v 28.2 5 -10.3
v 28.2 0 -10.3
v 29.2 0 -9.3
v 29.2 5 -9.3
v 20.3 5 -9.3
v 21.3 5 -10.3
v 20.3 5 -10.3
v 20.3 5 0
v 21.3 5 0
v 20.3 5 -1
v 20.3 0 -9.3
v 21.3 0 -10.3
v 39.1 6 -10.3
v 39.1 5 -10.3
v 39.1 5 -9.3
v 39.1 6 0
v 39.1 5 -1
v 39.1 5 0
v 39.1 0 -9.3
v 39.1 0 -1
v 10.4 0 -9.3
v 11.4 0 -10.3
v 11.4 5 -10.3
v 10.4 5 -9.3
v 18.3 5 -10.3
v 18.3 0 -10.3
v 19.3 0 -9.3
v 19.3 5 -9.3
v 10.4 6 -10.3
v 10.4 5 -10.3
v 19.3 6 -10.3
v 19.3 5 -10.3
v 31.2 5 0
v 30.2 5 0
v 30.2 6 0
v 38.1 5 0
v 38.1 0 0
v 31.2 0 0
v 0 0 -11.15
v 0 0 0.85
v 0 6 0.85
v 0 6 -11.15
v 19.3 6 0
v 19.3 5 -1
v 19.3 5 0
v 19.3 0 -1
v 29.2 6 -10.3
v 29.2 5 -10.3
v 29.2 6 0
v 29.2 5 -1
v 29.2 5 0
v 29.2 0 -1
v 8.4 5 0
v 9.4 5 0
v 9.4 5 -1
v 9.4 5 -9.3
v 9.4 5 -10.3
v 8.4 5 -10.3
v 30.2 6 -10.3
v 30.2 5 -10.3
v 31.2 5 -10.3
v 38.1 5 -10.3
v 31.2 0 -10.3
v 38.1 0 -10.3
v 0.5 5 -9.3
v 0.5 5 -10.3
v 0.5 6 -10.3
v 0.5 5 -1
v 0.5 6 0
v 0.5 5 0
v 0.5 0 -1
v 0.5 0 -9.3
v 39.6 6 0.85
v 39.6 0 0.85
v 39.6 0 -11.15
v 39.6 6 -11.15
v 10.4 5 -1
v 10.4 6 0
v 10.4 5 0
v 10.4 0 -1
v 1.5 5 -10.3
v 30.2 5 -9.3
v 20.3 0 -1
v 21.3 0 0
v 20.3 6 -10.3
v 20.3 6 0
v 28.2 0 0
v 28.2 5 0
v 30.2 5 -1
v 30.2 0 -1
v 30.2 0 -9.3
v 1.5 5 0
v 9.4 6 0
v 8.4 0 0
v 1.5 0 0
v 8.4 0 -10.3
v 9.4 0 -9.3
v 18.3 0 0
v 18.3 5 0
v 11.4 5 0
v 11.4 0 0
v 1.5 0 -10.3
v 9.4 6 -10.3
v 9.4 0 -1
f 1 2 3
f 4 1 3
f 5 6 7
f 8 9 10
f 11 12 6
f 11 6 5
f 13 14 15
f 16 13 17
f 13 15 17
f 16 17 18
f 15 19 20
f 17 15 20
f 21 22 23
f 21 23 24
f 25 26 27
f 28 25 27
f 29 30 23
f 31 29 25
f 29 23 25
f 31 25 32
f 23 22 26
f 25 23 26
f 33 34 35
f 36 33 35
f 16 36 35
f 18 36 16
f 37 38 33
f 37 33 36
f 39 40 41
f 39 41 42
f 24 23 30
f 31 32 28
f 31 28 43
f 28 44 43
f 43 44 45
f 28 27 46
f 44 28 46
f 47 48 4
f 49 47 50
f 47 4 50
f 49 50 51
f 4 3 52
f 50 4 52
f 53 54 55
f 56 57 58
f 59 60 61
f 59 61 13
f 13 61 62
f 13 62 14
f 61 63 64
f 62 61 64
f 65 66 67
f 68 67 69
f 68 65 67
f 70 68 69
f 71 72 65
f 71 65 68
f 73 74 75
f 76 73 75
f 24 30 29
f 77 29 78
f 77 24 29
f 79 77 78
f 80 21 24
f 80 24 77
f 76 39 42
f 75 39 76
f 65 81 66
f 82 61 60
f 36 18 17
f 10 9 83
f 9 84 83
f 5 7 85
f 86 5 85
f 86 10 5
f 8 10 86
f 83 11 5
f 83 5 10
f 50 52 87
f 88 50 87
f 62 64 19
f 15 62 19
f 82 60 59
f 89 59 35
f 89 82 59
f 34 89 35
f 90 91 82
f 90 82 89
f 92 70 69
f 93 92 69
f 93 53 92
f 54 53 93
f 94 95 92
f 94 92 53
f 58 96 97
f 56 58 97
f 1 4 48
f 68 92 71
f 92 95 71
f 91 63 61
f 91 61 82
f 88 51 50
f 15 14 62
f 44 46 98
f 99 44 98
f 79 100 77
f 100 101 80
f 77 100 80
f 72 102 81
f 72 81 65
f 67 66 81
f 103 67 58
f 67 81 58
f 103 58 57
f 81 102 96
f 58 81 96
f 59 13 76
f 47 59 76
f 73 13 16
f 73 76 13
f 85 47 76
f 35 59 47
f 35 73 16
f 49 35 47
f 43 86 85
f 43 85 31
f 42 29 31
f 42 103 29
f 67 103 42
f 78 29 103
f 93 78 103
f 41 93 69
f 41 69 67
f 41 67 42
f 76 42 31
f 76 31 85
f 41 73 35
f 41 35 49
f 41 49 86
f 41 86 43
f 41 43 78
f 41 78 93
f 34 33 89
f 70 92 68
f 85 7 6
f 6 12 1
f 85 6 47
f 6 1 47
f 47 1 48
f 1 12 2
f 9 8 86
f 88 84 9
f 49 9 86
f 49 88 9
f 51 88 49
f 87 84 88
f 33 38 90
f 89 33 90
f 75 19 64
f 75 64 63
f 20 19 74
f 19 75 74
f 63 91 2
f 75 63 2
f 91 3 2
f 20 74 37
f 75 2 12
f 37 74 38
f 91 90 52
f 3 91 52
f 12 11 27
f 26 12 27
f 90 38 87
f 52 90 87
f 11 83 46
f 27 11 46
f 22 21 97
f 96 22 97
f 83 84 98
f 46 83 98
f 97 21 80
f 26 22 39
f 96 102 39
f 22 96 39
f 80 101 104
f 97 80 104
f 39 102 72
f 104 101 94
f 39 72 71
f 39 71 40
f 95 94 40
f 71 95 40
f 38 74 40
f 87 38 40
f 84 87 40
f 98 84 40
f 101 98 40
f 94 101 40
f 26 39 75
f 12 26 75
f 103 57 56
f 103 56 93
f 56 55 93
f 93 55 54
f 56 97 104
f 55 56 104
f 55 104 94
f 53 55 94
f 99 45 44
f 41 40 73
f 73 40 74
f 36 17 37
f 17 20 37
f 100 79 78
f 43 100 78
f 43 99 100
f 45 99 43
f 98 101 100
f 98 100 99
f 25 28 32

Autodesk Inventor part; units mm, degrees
ref_plane "YZ Plane" through (0, 0, 0) normal (1, 0, 0) x (0, 1, 0)
ref_plane "XZ Plane" through (0, 0, 0) normal (0, 1, 0) x (-1, 0, 0)
ref_plane "XY Plane" through (0, 0, 0) normal (0, 0, 1) x (1, 0, 0)
sketch "Sketch1" plane through (0, 0, 0) normal (0, 1, 0) x (-1, 0, 0)
  line L0 (0, 0) -> (-9.9, 0)
  line L1 (0, 0) -> (0, -10.3)
  line L2 (0, -10.3) -> (-9.9, -10.3)
  line L3 (-9.9, -10.3) -> (-9.9, 0)
  line L4 (-9.9, -10.3) -> (-9.4, -10.3)
  line L5 (-9.4, -10.3) -> (-9.4, 0)
  line L6 (0, -10.3) -> (-0.5, -10.3)
  line L7 (-0.5, -10.3) -> (-0.5, 0)
  line L8 (-0.5, 0.85) -> (-9.9, 0.85)
  line L9 (-9.9, 0.85) -> (-9.9, 0)
  line L10 (0, 0) -> (0, 0.85)
  line L11 (0, 0.85) -> (-0.5, 0.85)
  line L12 (0, -10.3) -> (0, -11.15)
  line L13 (0, -11.15) -> (-9.9, -11.15)
  line L14 (-9.9, -11.15) -> (-9.9, -10.3)
  line L15 (-9.9, -11.15) -> (-19.8, -11.15)
  line L16 (-19.8, -11.15) -> (-19.8, -10.3)
  line L17 (-19.8, -10.3) -> (-19.8, 0)
  line L18 (-19.3, -10.3) -> (-19.3, 0)
  line L19 (-9.9, -10.3) -> (-19.8, -10.3)
  line L20 (-10.4, -10.3) -> (-10.4, 0)
  line L21 (-9.9, 0) -> (-9.9, -10.3)
  line L22 (-9.9, 0) -> (-9.9, 0.85)
  line L23 (-9.9, 0.85) -> (-10.4, 0.85)
  line L24 (-10.4, 0.85) -> (-19.8, 0.85)
  line L25 (-9.9, 0) -> (-19.8, 0)
  line L26 (-19.8, 0.85) -> (-19.8, 0)
  line L27 (-19.8, -11.15) -> (-29.7, -11.15)
  line L28 (-29.7, -11.15) -> (-29.7, -10.3)
  line L29 (-29.7, -10.3) -> (-29.7, 0)
  line L30 (-29.2, -10.3) -> (-29.2, 0)
  line L31 (-19.8, -10.3) -> (-29.7, -10.3)
  line L32 (-20.3, -10.3) -> (-20.3, 0)
  line L33 (-19.8, 0) -> (-19.8, -10.3)
  line L34 (-19.8, 0) -> (-19.8, 0.85)
  line L35 (-19.8, 0.85) -> (-20.3, 0.85)
  line L36 (-20.3, 0.85) -> (-29.7, 0.85)
  line L37 (-19.8, 0) -> (-29.7, 0)
  line L38 (-29.7, 0.85) -> (-29.7, 0)
  line L39 (-29.7, -11.15) -> (-39.6, -11.15)
  line L40 (-39.6, -11.15) -> (-39.6, -10.3)
  line L41 (-39.6, -10.3) -> (-39.6, 0)
  line L42 (-39.1, -10.3) -> (-39.1, 0)
  line L43 (-29.7, -10.3) -> (-39.6, -10.3)
  line L44 (-30.2, -10.3) -> (-30.2, 0)
  line L45 (-29.7, 0) -> (-29.7, -10.3)
  line L46 (-29.7, 0) -> (-29.7, 0.85)
  line L47 (-29.7, 0.85) -> (-30.2, 0.85)
  line L48 (-30.2, 0.85) -> (-39.6, 0.85)
  line L49 (-29.7, 0) -> (-39.6, 0)
  line L50 (-39.6, 0.85) -> (-39.6, 0)
  line L51 (-39.6, -11.15) -> (-49.5, -11.15)
  line L52 (-49.5, -11.15) -> (-49.5, -10.3)
  line L53 (-49.5, -10.3) -> (-49.5, 0)
  line L54 (-49, -10.3) -> (-49, 0)
  line L55 (-39.6, -10.3) -> (-49.5, -10.3)
  line L56 (-40.1, -10.3) -> (-40.1, 0)
  line L57 (-39.6, 0) -> (-39.6, -10.3)
  line L58 (-39.6, 0) -> (-39.6, 0.85)
  line L59 (-39.6, 0.85) -> (-40.1, 0.85)
  line L60 (-40.1, 0.85) -> (-49.5, 0.85)
  line L61 (-39.6, 0) -> (-49.5, 0)
  line L62 (-49.5, 0.85) -> (-49.5, 0)
  line L63 (-49.5, -11.15) -> (-59.4, -11.15)
  line L64 (-59.4, -11.15) -> (-59.4, -10.3)
  line L65 (-59.4, -10.3) -> (-59.4, 0)
  line L66 (-58.9, -10.3) -> (-58.9, 0)
  line L67 (-49.5, -10.3) -> (-59.4, -10.3)
  line L68 (-50, -10.3) -> (-50, 0)
  line L69 (-49.5, 0) -> (-49.5, -10.3)
  line L70 (-49.5, 0) -> (-49.5, 0.85)
  line L71 (-49.5, 0.85) -> (-50, 0.85)
  line L72 (-50, 0.85) -> (-59.4, 0.85)
  line L73 (-49.5, 0) -> (-59.4, 0)
  line L74 (-59.4, 0.85) -> (-59.4, 0)
  line L75 (-59.4, -11.15) -> (-69.3, -11.15)
  line L76 (-69.3, -11.15) -> (-69.3, -10.3)
  line L77 (-69.3, -10.3) -> (-69.3, 0)
  line L78 (-68.8, -10.3) -> (-68.8, 0)
  line L79 (-59.4, -10.3) -> (-69.3, -10.3)
  line L80 (-59.9, -10.3) -> (-59.9, 0)
  line L81 (-59.4, 0) -> (-59.4, -10.3)
  line L82 (-59.4, 0) -> (-59.4, 0.85)
  line L83 (-59.4, 0.85) -> (-59.9, 0.85)
  line L84 (-59.9, 0.85) -> (-69.3, 0.85)
  line L85 (-59.4, 0) -> (-69.3, 0)
  line L86 (-69.3, 0.85) -> (-69.3, 0)
  line L87 (-69.3, -11.15) -> (-79.2, -11.15)
  line L88 (-79.2, -11.15) -> (-79.2, -10.3)
  line L89 (-79.2, -10.3) -> (-79.2, 0)
  line L90 (-78.7, -10.3) -> (-78.7, 0)
  line L91 (-69.3, -10.3) -> (-79.2, -10.3)
  line L92 (-69.8, -10.3) -> (-69.8, 0)
  line L93 (-69.3, 0) -> (-69.3, -10.3)
  line L94 (-69.3, 0) -> (-69.3, 0.85)
  line L95 (-69.3, 0.85) -> (-69.8, 0.85)
  line L96 (-69.8, 0.85) -> (-79.2, 0.85)
  line L97 (-69.3, 0) -> (-79.2, 0)
  line L98 (-79.2, 0.85) -> (-79.2, 0)
  line L99 (-79.2, -11.15) -> (-89.1, -11.15)
  line L100 (-89.1, -11.15) -> (-89.1, -10.3)
  line L101 (-89.1, -10.3) -> (-89.1, 0)
  line L102 (-88.6, -10.3) -> (-88.6, 0)
  line L103 (-79.2, -10.3) -> (-89.1, -10.3)
  line L104 (-79.7, -10.3) -> (-79.7, 0)
  line L105 (-79.2, 0) -> (-79.2, -10.3)
  line L106 (-79.2, 0) -> (-79.2, 0.85)
  line L107 (-79.2, 0.85) -> (-79.7, 0.85)
  line L108 (-79.7, 0.85) -> (-89.1, 0.85)
  line L109 (-79.2, 0) -> (-89.1, 0)
  line L110 (-89.1, 0.85) -> (-89.1, 0)
  line L111 (-89.1, -11.15) -> (-99, -11.15)
  line L112 (-99, -11.15) -> (-99, -10.3)
  line L113 (-99, -10.3) -> (-99, 0)
  line L114 (-98.5, -10.3) -> (-98.5, 0)
  line L115 (-89.1, -10.3) -> (-99, -10.3)
  line L116 (-89.6, -10.3) -> (-89.6, 0)
  line L117 (-89.1, 0) -> (-89.1, -10.3)
  line L118 (-89.1, 0) -> (-89.1, 0.85)
  line L119 (-89.1, 0.85) -> (-89.6, 0.85)
  line L120 (-89.6, 0.85) -> (-99, 0.85)
  line L121 (-89.1, 0) -> (-99, 0)
  line L122 (-99, 0.85) -> (-99, 0)
  line L123 (0, -11.15) -> (0, 0.85)
  line L124 (0, -11.15) -> (0, -12.65)
  line L125 (0, -12.65) -> (1.5, -12.65)
  line L126 (-99, 0.85) -> (-100.5, 0.85)
  line L127 (-100.5, 0.85) -> (-100.5, 2.35)
  line L128 (1.5, -12.65) -> (-100.5, -12.65)
  line L129 (-100.5, -12.65) -> (-100.5, 2.35)
  line L130 (-100.5, 2.35) -> (1.5, 2.35)
  line L131 (1.5, 2.35) -> (1.5, -12.65)
  line L132 (0, -11.15) -> (1.5, -11.15)
  line L133 (0, 0.85) -> (1.5, 0.85)
  line L134 (0, -11.15) -> (-2, -11.15)
  line L135 (-2, -11.15) -> (-2, 0.85)
  line L136 (-0.5, -10.3) -> (-1.5, -10.3)
  line L137 (-1.5, -10.3) -> (-0.5, -9.3)
  line L138 (-9.4, -10.3) -> (-8.4, -10.3)
  line L139 (-8.4, -10.3) -> (-9.4, -9.3)
  line L140 (-9.4, 0) -> (-9.4, -1)
  line L141 (-9.4, -1) -> (-8.4, 0)
  line L142 (-2, 0) -> (-3, 0)
  line L143 (-0.5, 0) -> (-1.5, 0)
  line L144 (-1.5, 0) -> (-0.5, -1)
  dimension "d0" = 9.9
  dimension "d1" = 10.3
  dimension "d2" = 0.5
  dimension "d3" = 0.5
  dimension "d6" = 0.85
  dimension "d7" = 0.85
  dimension "d10" = 9.9
  dimension "d15" = 1.5
  dimension "d16" = 1.5
  dimension "d19" = 1.5
  dimension "d20" = 2
  dimension "d26" = 1
  dimension "d27" = 45
  dimension "d28" = 1
  dimension "d29" = 1
  dimension "d30" = 1
  dimension "d31" = 1
extrude "Extrusion1" add sketch "Sketch1" along normal blind 6 contours L1 L2 L7 L0 | L0 L135 L8 L11 L10 | L12 L13 L135 L2 | L0 L9 L8 L135 | L13 L14 L2 L135 | L3 L0 L5 L2
extrude "Extrusion2" add sketch "Sketch1" along normal blind 5 contours L7 L144 L0 | L2 L137 L7 | L141 L5 L0 | L2 L5 L139
pattern_linear "Rectangular Pattern1" count 4 spacing 9.9 along (1, 0, 0) of "Extrusion1", "Extrusion2"
equation "\"d25\" = d10"
properties part number "4x led strip divider"
